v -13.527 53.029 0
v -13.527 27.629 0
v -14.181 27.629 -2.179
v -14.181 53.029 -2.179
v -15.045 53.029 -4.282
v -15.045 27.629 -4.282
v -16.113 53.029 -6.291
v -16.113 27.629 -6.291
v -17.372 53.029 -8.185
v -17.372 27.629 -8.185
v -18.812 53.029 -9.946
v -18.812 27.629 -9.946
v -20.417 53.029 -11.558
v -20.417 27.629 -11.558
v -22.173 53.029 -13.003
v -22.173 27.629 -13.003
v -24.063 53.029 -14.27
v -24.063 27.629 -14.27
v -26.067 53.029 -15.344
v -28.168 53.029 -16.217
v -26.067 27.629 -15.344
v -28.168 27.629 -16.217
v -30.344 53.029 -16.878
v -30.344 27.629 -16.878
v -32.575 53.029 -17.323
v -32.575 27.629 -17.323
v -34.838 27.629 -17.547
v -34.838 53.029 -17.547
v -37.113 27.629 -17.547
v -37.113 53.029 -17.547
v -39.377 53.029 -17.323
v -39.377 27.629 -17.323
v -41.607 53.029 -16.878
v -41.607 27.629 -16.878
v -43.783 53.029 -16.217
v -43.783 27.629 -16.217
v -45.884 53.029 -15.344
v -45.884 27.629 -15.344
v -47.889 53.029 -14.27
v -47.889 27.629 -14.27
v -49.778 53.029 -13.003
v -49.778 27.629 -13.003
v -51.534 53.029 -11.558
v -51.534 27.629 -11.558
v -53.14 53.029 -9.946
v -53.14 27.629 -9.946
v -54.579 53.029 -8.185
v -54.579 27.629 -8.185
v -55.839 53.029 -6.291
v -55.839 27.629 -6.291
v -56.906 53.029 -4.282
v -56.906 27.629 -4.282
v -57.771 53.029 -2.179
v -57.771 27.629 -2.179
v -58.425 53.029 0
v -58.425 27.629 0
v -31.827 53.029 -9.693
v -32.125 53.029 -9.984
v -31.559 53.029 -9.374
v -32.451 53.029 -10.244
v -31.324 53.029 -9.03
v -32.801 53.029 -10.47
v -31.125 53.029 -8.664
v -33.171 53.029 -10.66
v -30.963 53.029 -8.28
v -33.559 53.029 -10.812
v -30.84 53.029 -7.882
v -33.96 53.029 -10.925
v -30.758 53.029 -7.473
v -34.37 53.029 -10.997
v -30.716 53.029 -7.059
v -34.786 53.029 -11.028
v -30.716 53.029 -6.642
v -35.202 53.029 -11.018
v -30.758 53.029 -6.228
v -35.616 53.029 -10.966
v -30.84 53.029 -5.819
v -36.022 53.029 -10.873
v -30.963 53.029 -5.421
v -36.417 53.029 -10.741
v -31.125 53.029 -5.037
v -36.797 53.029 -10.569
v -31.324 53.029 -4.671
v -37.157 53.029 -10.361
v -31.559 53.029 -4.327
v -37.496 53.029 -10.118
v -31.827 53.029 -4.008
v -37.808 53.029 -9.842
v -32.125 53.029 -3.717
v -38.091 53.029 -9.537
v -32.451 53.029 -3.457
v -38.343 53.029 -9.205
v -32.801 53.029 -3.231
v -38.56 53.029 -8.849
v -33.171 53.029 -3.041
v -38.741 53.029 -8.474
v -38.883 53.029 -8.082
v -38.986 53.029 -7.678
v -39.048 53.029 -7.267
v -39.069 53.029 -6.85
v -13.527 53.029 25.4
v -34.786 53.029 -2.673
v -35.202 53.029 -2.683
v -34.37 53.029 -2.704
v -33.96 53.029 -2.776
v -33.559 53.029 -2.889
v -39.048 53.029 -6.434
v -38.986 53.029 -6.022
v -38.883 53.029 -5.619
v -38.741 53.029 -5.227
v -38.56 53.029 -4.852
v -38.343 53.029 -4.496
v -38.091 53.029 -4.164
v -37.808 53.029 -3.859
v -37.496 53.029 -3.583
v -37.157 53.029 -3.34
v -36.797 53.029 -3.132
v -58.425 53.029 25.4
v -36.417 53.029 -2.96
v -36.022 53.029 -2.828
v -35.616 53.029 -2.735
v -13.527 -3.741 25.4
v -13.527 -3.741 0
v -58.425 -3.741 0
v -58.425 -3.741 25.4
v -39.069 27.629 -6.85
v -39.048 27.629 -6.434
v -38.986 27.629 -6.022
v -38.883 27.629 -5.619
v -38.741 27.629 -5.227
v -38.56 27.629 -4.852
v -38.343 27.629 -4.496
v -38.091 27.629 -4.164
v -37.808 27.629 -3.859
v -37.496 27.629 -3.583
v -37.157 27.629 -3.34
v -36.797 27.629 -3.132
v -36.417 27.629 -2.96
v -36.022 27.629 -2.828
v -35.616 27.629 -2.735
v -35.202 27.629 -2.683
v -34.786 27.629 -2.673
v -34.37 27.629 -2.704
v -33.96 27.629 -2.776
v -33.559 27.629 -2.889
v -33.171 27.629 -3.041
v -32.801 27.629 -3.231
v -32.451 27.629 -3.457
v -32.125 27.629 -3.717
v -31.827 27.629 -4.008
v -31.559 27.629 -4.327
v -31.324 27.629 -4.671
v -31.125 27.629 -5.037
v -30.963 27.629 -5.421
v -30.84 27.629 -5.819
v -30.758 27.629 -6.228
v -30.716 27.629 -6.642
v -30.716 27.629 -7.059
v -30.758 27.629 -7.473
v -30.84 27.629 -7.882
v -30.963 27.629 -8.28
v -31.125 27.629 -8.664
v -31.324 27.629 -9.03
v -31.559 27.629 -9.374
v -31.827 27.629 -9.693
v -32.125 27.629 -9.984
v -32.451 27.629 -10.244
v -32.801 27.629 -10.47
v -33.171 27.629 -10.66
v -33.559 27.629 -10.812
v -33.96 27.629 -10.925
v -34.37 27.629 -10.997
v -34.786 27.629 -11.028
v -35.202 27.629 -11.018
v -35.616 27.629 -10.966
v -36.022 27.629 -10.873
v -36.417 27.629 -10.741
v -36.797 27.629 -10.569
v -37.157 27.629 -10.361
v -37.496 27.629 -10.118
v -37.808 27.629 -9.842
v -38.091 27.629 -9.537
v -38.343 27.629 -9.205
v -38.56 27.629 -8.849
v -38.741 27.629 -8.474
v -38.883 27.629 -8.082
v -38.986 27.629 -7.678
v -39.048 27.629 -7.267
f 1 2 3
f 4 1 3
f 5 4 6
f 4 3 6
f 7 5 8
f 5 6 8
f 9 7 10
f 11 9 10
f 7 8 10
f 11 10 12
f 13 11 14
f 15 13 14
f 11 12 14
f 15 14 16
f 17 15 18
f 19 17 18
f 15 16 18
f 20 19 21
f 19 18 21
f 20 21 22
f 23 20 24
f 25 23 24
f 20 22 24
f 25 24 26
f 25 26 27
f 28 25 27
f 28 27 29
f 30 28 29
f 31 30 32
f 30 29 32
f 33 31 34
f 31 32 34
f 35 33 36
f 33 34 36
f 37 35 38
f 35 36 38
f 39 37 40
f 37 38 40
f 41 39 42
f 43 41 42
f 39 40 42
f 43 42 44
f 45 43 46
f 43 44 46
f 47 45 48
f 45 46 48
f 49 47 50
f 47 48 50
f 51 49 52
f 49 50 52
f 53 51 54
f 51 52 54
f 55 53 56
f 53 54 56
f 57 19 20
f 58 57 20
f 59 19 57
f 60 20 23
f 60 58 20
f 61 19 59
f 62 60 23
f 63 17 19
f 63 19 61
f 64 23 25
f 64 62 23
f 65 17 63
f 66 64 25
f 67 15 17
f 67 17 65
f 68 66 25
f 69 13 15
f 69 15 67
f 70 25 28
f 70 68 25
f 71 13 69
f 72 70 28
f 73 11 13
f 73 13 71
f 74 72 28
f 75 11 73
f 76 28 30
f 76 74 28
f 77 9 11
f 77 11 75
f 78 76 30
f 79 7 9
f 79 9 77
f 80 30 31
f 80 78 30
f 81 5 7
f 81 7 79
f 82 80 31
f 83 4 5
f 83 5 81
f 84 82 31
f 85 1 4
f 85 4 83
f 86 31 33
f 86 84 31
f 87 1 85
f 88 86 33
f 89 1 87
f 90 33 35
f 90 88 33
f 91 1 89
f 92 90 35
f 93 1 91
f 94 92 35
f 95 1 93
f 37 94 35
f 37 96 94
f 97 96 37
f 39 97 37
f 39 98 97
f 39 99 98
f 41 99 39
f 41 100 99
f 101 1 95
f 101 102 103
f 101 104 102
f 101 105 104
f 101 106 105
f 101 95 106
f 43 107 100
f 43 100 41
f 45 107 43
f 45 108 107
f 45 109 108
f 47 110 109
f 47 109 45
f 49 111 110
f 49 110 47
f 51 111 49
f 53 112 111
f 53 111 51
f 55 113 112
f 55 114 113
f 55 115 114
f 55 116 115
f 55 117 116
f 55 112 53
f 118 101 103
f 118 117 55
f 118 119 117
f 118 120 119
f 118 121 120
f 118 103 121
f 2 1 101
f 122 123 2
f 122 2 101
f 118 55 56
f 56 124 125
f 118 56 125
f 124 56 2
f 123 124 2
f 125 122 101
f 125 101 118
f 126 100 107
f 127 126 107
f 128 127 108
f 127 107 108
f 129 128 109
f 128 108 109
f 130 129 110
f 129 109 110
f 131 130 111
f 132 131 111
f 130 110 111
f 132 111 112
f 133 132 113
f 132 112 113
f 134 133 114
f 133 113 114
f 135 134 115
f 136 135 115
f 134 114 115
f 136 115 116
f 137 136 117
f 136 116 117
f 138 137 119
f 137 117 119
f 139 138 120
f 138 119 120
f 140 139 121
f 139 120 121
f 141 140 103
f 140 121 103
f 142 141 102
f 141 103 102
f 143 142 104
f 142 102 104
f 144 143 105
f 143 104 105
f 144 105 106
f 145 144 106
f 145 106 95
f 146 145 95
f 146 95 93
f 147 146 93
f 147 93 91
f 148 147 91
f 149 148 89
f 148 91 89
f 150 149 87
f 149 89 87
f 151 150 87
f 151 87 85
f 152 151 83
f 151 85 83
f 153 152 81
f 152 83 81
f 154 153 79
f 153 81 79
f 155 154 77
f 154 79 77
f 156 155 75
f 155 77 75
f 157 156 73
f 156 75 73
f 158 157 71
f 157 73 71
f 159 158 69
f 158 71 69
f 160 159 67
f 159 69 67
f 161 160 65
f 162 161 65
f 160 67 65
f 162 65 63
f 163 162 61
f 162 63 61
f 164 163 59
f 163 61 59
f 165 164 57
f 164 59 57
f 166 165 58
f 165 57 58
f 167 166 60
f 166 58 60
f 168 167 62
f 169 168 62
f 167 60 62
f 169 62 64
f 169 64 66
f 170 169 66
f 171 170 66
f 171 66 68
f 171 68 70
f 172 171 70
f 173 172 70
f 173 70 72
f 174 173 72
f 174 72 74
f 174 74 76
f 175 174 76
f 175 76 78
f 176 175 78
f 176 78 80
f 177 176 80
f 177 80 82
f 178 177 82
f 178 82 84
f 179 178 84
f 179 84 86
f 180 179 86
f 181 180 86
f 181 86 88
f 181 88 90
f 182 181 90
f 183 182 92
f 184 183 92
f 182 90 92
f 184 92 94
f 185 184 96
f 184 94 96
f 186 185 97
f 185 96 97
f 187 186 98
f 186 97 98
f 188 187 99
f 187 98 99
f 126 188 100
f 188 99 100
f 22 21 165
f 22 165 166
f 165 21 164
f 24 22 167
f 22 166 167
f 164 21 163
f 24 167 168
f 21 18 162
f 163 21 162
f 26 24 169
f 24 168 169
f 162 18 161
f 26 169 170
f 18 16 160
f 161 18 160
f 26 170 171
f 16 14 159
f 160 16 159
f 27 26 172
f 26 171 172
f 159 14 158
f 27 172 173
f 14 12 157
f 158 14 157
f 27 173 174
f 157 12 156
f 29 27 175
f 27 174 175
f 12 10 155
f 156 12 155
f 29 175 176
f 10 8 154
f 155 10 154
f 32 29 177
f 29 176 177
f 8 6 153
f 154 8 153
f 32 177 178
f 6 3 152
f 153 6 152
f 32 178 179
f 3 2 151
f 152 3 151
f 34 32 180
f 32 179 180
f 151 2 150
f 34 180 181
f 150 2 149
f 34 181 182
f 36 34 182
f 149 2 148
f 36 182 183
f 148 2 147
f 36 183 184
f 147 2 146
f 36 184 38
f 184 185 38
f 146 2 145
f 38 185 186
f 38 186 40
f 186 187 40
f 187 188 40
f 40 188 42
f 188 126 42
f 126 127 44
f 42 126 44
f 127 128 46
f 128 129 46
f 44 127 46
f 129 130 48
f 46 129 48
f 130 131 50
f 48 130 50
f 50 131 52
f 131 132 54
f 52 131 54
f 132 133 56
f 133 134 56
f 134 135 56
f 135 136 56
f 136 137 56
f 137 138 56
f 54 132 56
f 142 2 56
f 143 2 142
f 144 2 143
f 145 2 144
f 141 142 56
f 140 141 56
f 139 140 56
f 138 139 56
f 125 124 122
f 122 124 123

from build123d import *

# Parameters (mm, degrees)
F0_W     = 44.8976987973
F0_H     = 31.3708279282
F1_DEPTH = 25.4
F2_W     = 44.8976987973
F2_H     = 25.4
F3_DEPTH = 25.4
F4_R     = 4.1790450116
F5_DEPTH = 25.4


with BuildPart() as f1:
    # F0 (on Top) → F1 (new body)
    with BuildSketch(Plane.XY):
        with Locations((-35.9757202677, 11.9439391419)):
            Rectangle(F0_W, F0_H)
    extrude(amount=F1_DEPTH)

    # F2 (on face) → F3 (join)
    with BuildSketch(Plane(origin=(0, 27.629353106, 0), x_dir=(-1, 0, 0), z_dir=(0, 1, 0))):
        with BuildLine():
            Line((58.4245696664, 0), (13.5268708691, 0))
            ThreePointArc((13.5268708691, 0), (35.9757202677, -17.5745007714), (58.4245696664, 0))
        make_face()
        with Locations((35.9757202677, 12.7)):
            Rectangle(F2_W, F2_H)
    extrude(amount=F3_DEPTH)

    # F4 (on face) → F5 (cut)
    with BuildSketch(Plane(origin=(0, 53.029353106, 0), x_dir=(-1, 0, 0), z_dir=(0, 1, 0))):
        with Locations((34.8900407553, -6.8504069932)):
            Circle(F4_R)
    extrude(amount=-F5_DEPTH, mode=Mode.SUBTRACT)


solid = f1.part
